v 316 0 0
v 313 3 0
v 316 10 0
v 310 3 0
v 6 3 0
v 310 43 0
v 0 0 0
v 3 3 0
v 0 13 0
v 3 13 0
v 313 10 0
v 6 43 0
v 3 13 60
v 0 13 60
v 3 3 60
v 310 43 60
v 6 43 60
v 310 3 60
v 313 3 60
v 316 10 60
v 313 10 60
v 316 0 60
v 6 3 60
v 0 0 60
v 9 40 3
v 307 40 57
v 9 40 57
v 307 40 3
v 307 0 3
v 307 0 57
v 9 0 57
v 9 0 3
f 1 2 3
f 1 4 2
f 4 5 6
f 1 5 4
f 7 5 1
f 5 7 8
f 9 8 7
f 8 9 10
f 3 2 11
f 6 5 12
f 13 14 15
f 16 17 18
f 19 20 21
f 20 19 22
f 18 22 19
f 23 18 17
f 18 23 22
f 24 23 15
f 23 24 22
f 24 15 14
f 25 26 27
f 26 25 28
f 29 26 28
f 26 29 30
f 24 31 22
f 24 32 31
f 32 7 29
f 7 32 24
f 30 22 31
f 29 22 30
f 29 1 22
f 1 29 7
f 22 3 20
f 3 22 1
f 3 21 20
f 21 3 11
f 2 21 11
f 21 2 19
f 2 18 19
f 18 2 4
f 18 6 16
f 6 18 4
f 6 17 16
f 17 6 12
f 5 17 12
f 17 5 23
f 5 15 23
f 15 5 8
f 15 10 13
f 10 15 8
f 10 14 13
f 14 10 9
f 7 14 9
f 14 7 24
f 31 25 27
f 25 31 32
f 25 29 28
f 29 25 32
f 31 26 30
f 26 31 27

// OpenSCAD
$sideDepth = 10;
$sideThickness = 3;
$trayDepth = 40;

$length = 60;

{}

$drawerID = 304;

$drawerOD = 310;

$metal = ($drawerOD - $drawerID) / 2;


linear_extrude(60)
polygon(points=[
[0,0],
[$sideThickness + $metal + $sideThickness, 0],
[$sideThickness + $metal + $sideThickness, $trayDepth],
[$sideThickness + $metal + $sideThickness + ($drawerID - $sideThickness * 2), $trayDepth],
[$sideThickness + $metal + $sideThickness + ($drawerID - $sideThickness * 2), 0],

[($sideThickness + $metal + $sideThickness)*2 + ($drawerID - $sideThickness * 2), 0],
[($sideThickness + $metal + $sideThickness)*2 + ($drawerID - $sideThickness * 2), $sideDepth],
[$sideThickness*2 + $metal*2 + $sideThickness*1 + ($drawerID - $sideThickness * 2), $sideDepth],
[$sideThickness*2 + $metal*2 + $sideThickness*1 + ($drawerID - $sideThickness * 2), $sideThickness],
[$sideThickness*2 + $metal*1 + $sideThickness*1 + ($drawerID - $sideThickness * 2), $sideThickness],

[$sideThickness + $metal + $drawerID, $sideThickness + $trayDepth],
[$sideThickness + $metal, $sideThickness + $trayDepth],
[$sideThickness + $metal, $sideThickness],
[$sideThickness, $sideThickness], // 14
[$sideThickness, $sideThickness+$sideDepth], //15

[0, $sideThickness+$sideDepth],

]);

color("green")
translate([$sideThickness + $metal,0,0])
cube([$drawerID, $trayDepth + $sideThickness,$sideThickness]);

color("red")
translate([$sideThickness + $metal,0,$length-$sideThickness])
cube([$drawerID, $trayDepth + $sideThickness,$sideThickness]);
